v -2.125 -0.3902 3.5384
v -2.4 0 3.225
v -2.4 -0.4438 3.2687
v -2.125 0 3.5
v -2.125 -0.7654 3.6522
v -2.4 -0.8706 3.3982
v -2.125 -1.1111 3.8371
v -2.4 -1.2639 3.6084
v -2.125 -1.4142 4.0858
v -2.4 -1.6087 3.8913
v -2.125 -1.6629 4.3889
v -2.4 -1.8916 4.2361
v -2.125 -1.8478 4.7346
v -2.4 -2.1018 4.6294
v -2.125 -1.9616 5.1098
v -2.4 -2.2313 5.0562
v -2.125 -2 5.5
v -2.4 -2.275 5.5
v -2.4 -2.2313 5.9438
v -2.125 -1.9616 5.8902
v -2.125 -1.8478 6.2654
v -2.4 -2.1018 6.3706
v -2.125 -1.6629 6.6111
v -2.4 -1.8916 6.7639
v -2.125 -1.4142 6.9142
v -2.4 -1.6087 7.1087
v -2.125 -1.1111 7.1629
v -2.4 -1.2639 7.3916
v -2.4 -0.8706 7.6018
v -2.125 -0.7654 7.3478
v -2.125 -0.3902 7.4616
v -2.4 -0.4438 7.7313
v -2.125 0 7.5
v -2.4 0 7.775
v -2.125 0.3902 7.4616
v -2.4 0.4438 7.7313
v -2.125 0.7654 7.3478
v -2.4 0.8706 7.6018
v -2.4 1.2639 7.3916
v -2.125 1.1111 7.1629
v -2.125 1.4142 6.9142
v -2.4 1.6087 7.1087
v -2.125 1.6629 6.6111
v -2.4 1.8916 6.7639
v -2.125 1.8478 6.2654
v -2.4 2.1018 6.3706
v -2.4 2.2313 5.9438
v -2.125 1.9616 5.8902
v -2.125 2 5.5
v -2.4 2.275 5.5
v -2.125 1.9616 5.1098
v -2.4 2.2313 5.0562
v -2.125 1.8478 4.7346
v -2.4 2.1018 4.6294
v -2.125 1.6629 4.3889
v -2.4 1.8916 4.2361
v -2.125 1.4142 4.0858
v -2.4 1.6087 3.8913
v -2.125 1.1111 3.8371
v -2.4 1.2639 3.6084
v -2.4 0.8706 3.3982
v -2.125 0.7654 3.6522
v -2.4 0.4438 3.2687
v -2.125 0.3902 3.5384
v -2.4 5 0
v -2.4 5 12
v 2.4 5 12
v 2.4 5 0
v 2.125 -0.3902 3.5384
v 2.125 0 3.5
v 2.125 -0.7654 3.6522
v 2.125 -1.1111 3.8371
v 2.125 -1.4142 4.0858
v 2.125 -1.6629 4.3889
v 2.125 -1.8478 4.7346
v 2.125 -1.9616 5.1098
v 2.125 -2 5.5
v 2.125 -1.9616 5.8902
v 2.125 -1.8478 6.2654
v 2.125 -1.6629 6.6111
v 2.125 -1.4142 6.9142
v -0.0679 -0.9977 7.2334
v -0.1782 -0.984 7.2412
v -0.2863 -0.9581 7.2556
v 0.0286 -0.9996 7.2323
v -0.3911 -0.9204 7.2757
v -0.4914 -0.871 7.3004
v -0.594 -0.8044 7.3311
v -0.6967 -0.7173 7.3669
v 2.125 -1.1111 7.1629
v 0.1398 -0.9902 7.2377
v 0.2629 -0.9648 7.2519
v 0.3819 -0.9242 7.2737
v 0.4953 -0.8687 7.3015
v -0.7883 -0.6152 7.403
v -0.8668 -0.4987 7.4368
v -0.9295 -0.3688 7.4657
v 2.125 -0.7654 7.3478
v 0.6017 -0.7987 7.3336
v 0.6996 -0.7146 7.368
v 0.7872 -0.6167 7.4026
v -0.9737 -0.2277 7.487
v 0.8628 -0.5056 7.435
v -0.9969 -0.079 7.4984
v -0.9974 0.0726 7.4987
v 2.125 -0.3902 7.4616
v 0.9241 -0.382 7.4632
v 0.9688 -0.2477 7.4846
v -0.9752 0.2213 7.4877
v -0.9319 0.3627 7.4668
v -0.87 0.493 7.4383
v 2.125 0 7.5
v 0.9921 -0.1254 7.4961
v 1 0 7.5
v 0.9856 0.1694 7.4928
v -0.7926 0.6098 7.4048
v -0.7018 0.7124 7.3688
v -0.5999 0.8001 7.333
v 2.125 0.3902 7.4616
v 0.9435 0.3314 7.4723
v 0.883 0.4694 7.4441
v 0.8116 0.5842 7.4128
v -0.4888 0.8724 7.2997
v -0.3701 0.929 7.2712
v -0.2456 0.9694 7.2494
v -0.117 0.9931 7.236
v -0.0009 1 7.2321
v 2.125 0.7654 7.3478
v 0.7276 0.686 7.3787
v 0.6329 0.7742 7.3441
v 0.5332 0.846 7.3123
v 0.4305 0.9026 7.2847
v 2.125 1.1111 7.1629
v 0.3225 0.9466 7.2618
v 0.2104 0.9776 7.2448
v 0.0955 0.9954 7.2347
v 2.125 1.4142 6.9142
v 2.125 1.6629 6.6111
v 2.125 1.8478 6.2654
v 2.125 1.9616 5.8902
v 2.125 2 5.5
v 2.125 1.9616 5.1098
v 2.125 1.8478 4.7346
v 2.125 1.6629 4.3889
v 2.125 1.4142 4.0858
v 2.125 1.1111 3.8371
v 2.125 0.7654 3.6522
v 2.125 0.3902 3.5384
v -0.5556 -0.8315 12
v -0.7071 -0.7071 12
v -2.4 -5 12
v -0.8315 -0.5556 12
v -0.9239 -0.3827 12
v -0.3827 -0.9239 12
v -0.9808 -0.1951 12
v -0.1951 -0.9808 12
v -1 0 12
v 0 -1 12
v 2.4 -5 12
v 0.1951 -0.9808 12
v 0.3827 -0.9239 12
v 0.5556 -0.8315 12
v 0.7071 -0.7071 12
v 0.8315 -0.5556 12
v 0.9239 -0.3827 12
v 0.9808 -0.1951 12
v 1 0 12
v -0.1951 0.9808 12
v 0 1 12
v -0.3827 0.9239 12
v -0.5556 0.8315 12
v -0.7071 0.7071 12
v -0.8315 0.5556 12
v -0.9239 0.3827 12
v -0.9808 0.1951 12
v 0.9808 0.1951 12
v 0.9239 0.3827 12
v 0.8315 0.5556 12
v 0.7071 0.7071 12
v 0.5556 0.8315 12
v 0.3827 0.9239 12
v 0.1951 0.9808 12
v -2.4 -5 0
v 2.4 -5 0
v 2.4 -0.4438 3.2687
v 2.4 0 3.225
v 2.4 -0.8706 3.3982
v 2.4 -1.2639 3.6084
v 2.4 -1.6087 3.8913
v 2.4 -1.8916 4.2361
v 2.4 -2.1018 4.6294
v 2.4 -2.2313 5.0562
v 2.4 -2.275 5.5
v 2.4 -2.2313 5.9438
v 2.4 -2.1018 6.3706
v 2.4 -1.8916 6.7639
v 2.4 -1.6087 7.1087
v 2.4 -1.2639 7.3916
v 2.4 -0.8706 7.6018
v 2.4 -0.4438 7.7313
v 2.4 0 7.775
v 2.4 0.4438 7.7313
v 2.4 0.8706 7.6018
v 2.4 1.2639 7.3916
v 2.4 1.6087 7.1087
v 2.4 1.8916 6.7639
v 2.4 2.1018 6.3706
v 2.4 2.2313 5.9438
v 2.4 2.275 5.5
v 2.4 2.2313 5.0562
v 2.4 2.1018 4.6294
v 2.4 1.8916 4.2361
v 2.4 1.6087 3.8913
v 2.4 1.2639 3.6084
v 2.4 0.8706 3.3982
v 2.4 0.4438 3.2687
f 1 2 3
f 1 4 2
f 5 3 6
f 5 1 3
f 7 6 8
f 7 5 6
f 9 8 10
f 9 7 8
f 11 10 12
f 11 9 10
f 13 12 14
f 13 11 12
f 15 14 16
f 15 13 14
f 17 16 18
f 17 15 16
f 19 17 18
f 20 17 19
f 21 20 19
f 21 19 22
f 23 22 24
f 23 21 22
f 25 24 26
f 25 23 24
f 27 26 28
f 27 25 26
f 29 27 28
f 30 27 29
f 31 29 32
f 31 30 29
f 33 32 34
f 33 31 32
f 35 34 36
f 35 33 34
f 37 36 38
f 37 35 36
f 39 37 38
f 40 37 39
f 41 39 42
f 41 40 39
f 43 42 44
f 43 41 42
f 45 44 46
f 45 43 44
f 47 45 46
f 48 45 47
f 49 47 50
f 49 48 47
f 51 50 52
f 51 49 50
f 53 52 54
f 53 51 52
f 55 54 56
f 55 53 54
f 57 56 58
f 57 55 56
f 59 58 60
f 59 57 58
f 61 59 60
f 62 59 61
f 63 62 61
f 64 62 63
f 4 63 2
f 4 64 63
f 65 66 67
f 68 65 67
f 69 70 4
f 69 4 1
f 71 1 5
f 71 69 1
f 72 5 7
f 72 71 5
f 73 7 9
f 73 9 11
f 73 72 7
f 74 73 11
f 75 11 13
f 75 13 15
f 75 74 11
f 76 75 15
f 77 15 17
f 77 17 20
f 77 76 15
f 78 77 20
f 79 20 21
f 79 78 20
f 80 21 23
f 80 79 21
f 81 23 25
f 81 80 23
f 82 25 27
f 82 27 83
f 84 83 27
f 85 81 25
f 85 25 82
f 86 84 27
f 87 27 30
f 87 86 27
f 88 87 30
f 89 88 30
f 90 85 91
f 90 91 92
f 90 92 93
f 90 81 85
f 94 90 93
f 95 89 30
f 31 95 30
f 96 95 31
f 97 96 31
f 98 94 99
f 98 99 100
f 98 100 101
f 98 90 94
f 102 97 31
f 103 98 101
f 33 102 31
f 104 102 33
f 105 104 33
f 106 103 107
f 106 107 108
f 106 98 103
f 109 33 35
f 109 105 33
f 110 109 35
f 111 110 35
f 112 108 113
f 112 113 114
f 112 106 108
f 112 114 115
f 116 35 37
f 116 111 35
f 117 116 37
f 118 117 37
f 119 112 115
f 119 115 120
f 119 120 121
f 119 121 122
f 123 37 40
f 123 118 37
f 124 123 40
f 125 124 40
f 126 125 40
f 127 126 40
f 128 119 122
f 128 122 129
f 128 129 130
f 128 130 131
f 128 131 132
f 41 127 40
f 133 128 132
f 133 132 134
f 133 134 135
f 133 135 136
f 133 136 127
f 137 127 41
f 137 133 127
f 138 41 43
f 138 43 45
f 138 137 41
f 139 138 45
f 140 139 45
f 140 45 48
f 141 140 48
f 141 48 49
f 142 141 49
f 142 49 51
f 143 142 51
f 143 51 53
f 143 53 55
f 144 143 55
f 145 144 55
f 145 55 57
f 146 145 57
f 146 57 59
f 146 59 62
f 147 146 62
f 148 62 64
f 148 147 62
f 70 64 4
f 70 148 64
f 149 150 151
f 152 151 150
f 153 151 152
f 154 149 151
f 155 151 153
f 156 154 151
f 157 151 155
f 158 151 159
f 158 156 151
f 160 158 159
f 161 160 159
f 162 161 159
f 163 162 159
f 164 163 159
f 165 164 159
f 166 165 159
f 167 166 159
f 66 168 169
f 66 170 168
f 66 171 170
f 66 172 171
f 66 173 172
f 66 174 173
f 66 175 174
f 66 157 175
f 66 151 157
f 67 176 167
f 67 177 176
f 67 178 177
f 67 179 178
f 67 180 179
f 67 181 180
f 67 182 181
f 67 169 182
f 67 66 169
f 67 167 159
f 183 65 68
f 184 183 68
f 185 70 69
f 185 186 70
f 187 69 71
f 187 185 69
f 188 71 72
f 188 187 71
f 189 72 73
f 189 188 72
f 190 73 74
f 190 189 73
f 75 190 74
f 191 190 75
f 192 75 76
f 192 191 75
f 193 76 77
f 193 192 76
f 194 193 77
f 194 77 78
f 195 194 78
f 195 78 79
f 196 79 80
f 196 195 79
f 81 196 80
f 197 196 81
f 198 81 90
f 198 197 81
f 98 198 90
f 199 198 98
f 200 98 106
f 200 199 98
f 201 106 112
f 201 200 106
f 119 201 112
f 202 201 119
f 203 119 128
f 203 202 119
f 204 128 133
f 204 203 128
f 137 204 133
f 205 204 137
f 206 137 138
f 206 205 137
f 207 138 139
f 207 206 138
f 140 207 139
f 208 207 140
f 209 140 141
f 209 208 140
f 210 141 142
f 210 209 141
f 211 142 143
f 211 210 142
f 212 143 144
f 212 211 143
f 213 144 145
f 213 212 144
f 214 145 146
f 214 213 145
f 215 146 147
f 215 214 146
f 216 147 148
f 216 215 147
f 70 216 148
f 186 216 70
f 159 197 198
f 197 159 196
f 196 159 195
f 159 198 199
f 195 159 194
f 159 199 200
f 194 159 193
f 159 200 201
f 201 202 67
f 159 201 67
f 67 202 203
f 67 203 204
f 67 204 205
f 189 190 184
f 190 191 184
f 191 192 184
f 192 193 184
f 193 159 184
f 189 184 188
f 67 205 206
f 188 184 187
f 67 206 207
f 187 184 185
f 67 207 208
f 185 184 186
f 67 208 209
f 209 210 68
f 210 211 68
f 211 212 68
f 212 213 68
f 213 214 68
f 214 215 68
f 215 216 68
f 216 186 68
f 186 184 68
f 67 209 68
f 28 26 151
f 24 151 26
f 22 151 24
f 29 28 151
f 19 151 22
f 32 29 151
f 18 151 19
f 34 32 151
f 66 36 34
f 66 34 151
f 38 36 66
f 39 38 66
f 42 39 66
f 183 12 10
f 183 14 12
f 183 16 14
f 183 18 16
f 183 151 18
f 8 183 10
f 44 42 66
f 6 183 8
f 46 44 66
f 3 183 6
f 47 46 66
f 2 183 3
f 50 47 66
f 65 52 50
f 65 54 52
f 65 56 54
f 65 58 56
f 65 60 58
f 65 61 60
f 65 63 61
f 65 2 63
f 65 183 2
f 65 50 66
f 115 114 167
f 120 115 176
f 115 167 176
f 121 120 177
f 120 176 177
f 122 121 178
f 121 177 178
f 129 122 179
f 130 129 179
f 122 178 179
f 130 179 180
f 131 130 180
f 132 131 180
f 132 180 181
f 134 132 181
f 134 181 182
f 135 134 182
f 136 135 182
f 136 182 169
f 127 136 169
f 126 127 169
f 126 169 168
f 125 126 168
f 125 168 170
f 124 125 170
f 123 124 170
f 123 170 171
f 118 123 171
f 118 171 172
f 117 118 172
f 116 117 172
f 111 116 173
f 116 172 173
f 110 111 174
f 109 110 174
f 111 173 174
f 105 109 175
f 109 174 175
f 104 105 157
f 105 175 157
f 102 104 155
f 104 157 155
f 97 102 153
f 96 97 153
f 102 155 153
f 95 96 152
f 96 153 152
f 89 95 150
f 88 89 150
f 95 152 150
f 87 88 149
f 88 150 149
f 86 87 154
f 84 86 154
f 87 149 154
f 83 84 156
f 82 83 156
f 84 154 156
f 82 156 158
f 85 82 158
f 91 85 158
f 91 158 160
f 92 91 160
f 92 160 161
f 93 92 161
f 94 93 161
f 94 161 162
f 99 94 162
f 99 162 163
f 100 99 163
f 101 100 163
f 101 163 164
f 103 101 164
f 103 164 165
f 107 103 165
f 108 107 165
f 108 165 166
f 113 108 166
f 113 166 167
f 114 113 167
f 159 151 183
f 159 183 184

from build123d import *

# Parameters (mm, degrees)
SKETCH_1_W          = 4.8
SKETCH_1_H          = 10
EXTRUDE_1_DEPTH     = 12
CUT_EXTRUDE_1_REACH = 14
SKETCH_4_R          = 1


with BuildPart() as part:
    # Эскиз1 → Бобышка-Вытянуть1 (new body)
    with BuildSketch(Plane.XY):
        Rectangle(SKETCH_1_W, SKETCH_1_H)
    extrude(amount=EXTRUDE_1_DEPTH)

    # Эскиз2 → Отверстие обработанное метчиком M41 (revolve, cut)
    with BuildSketch(Plane(origin=(2.4, 0, 5.5), x_dir=(0, 0, -1), z_dir=(0, 1, 0))):
        Polygon((0, 0), (0, 4.8), (2.275, 4.8), (2, 4.525), (2, 0.275), (2.275, 0), align=None)
    revolve(axis=Axis((8.75, 0, 5.5), (-1, 0, 0)), mode=Mode.SUBTRACT)

    # Эскиз4 → Вырез-Вытянуть1 (cut, up to next)
    with BuildSketch(Plane.XY.offset(12), mode=Mode.PRIVATE) as cut_extrude_1_sk1:
        Circle(SKETCH_4_R)
    cut_extrude_1_tool1 = extrude(cut_extrude_1_sk1.sketch, amount=-CUT_EXTRUDE_1_REACH, mode=Mode.PRIVATE) & part.part
    add(cut_extrude_1_tool1.solids().sort_by_distance((0, 0, 12))[0], mode=Mode.SUBTRACT)


solid = part.part
